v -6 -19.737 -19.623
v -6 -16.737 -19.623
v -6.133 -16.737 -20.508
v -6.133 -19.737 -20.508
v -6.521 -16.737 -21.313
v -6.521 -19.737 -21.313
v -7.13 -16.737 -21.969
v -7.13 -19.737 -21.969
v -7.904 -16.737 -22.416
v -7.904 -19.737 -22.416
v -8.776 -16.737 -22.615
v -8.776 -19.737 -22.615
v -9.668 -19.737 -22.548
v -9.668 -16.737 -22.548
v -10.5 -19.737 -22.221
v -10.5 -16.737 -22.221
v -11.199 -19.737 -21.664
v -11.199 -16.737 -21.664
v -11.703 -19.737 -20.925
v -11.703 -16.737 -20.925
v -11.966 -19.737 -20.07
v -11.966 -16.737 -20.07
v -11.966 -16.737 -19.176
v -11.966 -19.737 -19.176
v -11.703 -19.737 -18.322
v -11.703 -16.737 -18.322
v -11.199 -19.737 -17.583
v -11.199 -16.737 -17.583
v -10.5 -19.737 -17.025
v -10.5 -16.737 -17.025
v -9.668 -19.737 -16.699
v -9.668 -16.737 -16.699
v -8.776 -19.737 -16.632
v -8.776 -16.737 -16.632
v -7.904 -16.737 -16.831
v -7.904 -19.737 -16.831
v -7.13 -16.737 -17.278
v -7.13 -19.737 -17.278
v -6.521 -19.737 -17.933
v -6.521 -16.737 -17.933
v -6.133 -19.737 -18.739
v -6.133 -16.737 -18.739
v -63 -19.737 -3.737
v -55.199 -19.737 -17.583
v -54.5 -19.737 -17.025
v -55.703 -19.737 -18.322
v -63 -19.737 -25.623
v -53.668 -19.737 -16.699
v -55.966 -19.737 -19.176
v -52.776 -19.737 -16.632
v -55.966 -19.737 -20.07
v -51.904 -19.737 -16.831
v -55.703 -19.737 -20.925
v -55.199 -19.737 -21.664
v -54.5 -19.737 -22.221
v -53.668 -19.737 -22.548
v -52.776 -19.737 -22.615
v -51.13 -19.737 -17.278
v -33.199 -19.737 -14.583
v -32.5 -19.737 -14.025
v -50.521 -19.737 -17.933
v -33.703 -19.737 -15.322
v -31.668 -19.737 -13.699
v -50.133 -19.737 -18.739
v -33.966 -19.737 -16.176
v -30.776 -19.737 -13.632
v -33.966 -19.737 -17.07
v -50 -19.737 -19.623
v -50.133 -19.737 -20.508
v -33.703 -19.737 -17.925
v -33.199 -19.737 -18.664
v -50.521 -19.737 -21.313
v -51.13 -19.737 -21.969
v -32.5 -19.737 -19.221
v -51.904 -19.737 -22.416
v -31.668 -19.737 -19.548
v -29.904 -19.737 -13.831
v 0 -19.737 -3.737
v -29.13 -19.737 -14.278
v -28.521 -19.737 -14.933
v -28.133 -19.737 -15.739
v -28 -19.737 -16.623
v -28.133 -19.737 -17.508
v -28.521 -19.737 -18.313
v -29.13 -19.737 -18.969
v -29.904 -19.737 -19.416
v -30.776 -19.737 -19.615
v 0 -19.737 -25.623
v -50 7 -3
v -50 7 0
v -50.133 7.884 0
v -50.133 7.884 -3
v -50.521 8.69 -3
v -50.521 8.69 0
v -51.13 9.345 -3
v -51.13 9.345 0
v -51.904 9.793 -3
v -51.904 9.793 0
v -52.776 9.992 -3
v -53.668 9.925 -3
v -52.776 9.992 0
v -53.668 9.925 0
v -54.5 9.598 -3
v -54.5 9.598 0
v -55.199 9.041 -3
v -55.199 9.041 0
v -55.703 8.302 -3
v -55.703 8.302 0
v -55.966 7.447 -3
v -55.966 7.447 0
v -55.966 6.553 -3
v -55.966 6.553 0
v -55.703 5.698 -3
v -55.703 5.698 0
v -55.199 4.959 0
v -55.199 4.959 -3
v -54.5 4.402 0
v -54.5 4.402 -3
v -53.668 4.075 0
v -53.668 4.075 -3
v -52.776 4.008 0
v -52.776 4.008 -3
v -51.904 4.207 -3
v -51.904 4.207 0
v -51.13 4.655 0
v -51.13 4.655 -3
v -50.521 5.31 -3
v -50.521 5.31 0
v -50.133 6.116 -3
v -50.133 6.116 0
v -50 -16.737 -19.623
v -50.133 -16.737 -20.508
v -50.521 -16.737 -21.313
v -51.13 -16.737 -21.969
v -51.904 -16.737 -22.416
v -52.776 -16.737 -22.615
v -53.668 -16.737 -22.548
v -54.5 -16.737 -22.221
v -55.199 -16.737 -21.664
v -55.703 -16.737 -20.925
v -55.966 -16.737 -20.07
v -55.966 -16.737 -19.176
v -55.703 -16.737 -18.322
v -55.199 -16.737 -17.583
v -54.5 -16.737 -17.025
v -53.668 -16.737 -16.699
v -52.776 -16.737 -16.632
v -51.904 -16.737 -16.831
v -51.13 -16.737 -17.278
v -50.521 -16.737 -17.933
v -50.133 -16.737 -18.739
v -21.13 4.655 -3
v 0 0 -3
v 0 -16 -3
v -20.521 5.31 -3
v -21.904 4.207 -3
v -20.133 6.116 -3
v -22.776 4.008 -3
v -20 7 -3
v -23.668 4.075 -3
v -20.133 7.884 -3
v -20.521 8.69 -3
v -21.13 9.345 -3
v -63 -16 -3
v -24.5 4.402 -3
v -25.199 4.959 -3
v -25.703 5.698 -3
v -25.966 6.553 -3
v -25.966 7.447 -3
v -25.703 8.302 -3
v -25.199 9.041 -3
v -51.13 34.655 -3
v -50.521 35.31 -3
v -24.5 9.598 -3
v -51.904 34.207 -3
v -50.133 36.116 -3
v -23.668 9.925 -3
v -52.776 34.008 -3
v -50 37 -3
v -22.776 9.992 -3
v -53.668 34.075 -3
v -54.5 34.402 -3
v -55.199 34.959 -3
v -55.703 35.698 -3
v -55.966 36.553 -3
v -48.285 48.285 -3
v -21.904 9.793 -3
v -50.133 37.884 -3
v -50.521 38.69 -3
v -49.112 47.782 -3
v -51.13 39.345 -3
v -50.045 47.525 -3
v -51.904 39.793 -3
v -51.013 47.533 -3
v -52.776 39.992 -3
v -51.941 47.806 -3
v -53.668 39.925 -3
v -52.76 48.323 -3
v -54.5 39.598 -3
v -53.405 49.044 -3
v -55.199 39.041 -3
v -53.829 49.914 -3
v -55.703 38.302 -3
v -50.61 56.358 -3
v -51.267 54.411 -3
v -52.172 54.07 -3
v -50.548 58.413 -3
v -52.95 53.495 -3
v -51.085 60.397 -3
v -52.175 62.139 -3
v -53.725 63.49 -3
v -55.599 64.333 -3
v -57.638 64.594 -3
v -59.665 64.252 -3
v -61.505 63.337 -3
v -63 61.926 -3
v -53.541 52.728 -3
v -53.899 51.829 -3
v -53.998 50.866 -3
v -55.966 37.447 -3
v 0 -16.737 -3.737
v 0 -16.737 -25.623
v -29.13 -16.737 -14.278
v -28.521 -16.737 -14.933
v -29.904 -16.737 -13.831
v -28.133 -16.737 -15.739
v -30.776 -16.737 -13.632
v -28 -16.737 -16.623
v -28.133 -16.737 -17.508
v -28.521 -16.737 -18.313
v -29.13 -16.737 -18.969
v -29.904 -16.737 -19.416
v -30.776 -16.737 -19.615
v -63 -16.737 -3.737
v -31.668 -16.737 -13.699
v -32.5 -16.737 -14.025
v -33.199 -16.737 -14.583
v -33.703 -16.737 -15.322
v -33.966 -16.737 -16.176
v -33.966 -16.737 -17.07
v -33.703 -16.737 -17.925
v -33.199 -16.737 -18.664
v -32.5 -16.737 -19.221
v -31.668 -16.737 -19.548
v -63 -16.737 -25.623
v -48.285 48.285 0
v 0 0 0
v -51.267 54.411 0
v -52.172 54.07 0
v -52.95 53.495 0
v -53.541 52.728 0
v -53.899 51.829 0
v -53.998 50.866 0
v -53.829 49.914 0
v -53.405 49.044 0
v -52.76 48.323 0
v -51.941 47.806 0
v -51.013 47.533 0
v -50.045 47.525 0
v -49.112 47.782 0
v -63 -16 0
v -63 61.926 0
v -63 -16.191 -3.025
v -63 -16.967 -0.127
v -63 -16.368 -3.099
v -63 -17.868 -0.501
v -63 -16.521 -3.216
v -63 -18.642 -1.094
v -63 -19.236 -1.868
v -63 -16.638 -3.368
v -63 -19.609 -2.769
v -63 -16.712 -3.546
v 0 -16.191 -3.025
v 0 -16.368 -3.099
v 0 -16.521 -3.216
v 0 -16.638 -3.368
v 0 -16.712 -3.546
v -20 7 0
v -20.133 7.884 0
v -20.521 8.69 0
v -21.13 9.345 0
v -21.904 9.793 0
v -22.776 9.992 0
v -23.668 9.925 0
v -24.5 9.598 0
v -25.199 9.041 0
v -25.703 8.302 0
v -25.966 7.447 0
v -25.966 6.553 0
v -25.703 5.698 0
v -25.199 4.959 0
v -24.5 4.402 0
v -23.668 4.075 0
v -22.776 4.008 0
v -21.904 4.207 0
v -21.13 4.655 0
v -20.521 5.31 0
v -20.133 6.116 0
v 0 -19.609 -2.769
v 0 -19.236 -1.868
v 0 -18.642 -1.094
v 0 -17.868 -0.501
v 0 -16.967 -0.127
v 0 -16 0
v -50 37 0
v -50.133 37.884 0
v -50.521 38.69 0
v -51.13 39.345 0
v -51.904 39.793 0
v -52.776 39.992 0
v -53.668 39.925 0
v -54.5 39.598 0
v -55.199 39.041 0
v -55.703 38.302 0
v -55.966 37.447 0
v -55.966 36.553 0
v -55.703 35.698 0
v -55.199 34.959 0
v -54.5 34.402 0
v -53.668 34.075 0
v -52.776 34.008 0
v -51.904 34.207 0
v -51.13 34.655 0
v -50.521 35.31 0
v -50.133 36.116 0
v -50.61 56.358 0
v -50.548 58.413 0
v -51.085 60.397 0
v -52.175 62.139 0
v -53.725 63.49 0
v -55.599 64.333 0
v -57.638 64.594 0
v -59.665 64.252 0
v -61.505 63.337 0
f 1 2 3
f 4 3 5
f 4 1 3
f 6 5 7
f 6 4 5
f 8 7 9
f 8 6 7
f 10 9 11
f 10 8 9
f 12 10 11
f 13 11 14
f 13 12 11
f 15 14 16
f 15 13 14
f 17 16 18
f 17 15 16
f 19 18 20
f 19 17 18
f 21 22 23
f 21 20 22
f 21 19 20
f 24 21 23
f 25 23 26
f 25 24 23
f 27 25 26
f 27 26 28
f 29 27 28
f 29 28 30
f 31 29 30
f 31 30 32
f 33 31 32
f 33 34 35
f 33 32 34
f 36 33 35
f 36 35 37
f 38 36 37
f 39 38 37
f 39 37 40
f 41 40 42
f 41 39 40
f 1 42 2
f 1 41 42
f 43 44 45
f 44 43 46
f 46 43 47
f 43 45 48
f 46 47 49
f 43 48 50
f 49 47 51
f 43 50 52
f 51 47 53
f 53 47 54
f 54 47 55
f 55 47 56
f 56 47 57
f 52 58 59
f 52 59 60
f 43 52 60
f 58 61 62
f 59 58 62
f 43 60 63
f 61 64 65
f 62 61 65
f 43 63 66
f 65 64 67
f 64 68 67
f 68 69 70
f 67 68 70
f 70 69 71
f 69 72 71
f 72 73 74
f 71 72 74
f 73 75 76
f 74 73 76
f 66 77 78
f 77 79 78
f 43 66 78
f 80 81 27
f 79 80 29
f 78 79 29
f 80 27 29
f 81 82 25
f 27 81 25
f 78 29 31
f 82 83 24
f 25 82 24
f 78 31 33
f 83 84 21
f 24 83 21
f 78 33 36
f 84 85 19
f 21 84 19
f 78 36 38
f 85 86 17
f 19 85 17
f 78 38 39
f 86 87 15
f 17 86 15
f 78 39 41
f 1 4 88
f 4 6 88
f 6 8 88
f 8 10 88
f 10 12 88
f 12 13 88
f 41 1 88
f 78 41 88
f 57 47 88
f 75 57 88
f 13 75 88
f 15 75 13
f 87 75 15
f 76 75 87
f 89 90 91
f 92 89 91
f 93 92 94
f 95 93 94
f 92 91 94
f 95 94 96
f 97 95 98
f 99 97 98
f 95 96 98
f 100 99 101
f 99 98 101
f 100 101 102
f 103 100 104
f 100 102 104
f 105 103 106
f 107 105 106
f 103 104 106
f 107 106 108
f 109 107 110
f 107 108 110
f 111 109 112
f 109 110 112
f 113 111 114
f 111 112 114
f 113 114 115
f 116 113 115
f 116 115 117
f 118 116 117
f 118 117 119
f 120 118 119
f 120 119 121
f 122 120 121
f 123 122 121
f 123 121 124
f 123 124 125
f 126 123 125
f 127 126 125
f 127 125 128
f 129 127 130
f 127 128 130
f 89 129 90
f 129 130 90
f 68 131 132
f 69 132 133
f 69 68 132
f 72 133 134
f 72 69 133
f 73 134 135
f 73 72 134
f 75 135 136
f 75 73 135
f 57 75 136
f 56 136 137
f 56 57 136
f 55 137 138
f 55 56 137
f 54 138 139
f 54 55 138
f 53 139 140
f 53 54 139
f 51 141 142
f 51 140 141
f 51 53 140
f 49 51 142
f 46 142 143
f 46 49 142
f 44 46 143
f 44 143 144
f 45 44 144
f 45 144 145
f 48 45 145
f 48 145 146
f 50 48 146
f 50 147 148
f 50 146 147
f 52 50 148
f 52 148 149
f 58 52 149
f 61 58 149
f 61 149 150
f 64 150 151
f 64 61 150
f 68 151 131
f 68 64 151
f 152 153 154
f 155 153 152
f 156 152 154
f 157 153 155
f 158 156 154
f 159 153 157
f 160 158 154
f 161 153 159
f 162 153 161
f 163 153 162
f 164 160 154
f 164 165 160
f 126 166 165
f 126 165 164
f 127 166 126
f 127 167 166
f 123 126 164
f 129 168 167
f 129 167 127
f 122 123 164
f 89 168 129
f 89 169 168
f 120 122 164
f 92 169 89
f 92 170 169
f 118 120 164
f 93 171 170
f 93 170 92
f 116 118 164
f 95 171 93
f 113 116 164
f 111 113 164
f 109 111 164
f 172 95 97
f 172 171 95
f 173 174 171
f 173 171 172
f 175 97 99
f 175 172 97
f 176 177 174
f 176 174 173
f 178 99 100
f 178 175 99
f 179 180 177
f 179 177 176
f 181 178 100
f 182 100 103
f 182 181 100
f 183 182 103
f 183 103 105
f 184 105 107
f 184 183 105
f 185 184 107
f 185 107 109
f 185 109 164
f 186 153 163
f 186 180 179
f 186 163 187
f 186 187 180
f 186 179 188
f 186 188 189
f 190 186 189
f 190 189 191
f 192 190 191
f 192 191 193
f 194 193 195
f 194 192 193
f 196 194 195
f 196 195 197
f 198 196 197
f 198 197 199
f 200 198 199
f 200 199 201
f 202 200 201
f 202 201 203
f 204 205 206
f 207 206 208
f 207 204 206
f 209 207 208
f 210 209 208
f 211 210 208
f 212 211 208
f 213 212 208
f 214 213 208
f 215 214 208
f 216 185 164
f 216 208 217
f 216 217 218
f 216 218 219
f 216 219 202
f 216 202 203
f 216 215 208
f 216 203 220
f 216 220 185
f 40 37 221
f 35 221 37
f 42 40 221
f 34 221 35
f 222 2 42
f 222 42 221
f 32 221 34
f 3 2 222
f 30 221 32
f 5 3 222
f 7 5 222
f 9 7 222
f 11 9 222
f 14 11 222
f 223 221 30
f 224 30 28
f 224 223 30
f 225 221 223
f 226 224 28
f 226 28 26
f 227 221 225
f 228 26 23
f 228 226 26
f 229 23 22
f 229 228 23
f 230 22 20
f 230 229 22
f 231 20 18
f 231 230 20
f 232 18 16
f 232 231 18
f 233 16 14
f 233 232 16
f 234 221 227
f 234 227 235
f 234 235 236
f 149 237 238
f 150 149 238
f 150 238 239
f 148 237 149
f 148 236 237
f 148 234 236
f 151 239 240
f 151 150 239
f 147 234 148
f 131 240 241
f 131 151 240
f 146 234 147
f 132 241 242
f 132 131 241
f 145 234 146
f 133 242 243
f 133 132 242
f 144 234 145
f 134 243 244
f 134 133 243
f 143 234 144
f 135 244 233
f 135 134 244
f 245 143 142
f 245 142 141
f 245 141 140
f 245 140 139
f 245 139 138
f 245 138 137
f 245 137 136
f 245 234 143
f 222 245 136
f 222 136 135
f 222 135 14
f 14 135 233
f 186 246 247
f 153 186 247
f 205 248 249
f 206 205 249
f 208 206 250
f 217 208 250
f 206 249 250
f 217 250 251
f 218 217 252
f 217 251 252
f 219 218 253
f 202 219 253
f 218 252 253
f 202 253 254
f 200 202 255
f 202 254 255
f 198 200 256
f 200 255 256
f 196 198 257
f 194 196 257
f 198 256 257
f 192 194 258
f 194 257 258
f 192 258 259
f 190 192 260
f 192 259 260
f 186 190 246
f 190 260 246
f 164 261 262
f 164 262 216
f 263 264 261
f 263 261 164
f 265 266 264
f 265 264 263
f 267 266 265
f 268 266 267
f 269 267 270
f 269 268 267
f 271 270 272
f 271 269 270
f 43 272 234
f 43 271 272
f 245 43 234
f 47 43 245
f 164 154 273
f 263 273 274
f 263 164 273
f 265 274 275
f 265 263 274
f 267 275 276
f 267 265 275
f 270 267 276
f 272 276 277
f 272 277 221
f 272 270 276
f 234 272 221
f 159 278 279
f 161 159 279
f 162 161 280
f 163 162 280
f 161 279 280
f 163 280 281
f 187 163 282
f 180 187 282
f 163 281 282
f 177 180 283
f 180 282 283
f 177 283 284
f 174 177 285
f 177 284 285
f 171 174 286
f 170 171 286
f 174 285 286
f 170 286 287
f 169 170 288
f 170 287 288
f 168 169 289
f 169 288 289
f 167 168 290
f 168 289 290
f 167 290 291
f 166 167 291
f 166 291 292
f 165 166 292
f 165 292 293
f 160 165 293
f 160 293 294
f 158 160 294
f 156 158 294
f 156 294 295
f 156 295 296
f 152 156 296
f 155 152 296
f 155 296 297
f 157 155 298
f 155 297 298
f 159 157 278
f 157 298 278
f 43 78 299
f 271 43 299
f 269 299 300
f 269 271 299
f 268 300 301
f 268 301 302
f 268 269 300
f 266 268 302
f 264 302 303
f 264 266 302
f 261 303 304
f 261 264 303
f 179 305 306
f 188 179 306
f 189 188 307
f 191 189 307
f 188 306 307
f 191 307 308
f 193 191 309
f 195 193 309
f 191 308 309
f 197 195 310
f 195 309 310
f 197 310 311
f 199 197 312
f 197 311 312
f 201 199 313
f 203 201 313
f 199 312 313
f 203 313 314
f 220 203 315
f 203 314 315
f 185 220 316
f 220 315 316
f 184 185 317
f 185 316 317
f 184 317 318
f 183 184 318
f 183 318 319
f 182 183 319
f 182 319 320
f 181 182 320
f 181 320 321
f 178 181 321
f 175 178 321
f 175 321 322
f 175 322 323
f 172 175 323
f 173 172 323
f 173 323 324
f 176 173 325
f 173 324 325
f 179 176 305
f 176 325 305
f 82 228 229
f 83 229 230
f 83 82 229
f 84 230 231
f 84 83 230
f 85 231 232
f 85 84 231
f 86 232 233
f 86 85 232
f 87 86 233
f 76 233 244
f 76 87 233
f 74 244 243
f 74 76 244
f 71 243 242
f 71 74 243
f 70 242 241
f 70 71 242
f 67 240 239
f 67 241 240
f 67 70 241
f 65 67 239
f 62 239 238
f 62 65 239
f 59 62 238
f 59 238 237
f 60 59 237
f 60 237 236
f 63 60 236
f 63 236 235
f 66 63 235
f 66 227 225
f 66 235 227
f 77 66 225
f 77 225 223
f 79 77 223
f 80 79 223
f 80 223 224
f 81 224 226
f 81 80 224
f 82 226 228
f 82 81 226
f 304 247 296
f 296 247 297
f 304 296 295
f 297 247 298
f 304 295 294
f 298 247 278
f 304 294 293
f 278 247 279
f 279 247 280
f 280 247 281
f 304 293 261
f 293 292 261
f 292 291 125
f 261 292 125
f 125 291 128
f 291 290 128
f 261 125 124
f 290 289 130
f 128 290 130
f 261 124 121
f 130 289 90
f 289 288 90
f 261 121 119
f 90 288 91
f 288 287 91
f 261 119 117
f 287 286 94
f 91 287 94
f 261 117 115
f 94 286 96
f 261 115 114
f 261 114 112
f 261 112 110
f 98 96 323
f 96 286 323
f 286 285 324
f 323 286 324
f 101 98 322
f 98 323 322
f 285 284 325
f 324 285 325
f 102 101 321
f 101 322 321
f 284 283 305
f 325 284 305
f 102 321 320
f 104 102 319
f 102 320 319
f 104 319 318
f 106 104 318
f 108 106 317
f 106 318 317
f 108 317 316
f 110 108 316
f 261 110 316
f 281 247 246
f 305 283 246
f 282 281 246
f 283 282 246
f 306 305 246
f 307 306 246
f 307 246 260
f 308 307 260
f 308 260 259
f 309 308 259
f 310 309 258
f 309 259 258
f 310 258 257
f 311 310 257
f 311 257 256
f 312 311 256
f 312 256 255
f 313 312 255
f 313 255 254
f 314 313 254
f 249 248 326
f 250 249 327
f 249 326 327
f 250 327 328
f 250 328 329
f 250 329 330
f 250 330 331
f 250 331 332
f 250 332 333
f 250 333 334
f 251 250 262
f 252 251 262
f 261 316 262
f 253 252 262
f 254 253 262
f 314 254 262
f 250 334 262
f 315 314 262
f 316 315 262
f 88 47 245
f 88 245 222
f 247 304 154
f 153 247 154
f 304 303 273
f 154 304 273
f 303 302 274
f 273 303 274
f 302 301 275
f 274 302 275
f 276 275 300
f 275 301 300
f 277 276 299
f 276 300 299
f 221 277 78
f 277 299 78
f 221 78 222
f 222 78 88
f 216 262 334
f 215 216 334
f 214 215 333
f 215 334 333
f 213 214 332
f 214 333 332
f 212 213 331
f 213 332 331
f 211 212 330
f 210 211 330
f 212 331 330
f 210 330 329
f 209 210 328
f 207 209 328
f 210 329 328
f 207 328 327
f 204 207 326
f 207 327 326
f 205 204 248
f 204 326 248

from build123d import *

# Parameters (mm, degrees)
SCHIZZO2_R                           = 3
BASE_FLANGIA1_DEPTH                  = 3
PIEGATURA_START                      = -41.4
PIEGATURA_DELLO_SCHIZZO1_OUTLINE_W   = 63
PIEGATURA_DELLO_SCHIZZO1_OUTLINE_H   = 3
PIEGATURA_DELLO_SCHIZZO1_DEPTH       = 21.6634
PIEGATURA_START_2                    = -19.383939692
PIEGATURA_DELLO_SCHIZZO1_2_OUTLINE_W = 63
PIEGATURA_DELLO_SCHIZZO1_2_OUTLINE_H = 22.623356935
PIEGATURA_DELLO_SCHIZZO1_2_OUTLINE_R = 3
PIEGATURA_DELLO_SCHIZZO1_2_DEPTH     = 2.647339692
PIEGATURA_START_3                    = -19.7366
PIEGATURA_DELLO_SCHIZZO1_3_OUTLINE_W = 63
PIEGATURA_DELLO_SCHIZZO1_3_OUTLINE_H = 22.623356935
PIEGATURA_DELLO_SCHIZZO1_3_OUTLINE_R = 3
PIEGATURA_DELLO_SCHIZZO1_3_DEPTH     = 3.7366
PIEGATURA_START_4                    = -64
PIEGATURA_DELLO_SCHIZZO1_4_DEPTH     = 64


with BuildPart() as part:
    # Base-Flangia1: sheet metal written as solids
    # Schizzo2 → Base-Flangia1 (new body)
    with BuildSketch(Plane.XY):
        with BuildLine():
            Line((0, 0), (0, -41.4))
            Line((0, -41.4), (-63, -41.4))
            Line((-63, -41.4), (-63, 61.925683224))
            ThreePointArc((-63, 61.925683224), (-53.724596428, 63.490157792), (-51.266546346, 54.410582808))
            ThreePointArc((-51.266546346, 54.410582808), (-53.647048092, 49.463861618), (-48.285339065, 48.285339065))
            Line((-48.285339065, 48.285339065), (0, 0))
        make_face()
        with Locations((-53, 37)):
            Circle(SCHIZZO2_R, mode=Mode.SUBTRACT)
        with Locations((-53, 7)):
            Circle(SCHIZZO2_R, mode=Mode.SUBTRACT)
        with Locations((-23, 7)):
            Circle(SCHIZZO2_R, mode=Mode.SUBTRACT)
        with Locations((-53, -35.4)):
            Circle(SCHIZZO2_R, mode=Mode.SUBTRACT)
        with Locations((-31, -32.4)):
            Circle(SCHIZZO2_R, mode=Mode.SUBTRACT)
        with Locations((-9, -35.4)):
            Circle(SCHIZZO2_R, mode=Mode.SUBTRACT)
    extrude(amount=-BASE_FLANGIA1_DEPTH)

    # Piegatura dello schizzo1: read off the stored shape, not the designer's step
    # Piegatura dello schizzo1 outline → Piegatura dello schizzo1 (cut)
    with BuildSketch(Plane(origin=(0, 0, 0), x_dir=(1, 0, 0), z_dir=(0, 1, 0)).offset(PIEGATURA_START)):
        with Locations((-31.5, 1.5)):
            Rectangle(PIEGATURA_DELLO_SCHIZZO1_OUTLINE_W, PIEGATURA_DELLO_SCHIZZO1_OUTLINE_H)
    extrude(amount=PIEGATURA_DELLO_SCHIZZO1_DEPTH, mode=Mode.SUBTRACT)

    # Piegatura dello schizzo1 2 outline → Piegatura dello schizzo1 2 (add)
    with BuildSketch(Plane(origin=(0, 0, 0), x_dir=(1, 0, 0), z_dir=(0, 1, 0)).offset(PIEGATURA_START_2)):
        with Locations((-31.5, 14.311678468)):
            Rectangle(PIEGATURA_DELLO_SCHIZZO1_2_OUTLINE_W, PIEGATURA_DELLO_SCHIZZO1_2_OUTLINE_H)
        with Locations((-53, 19.623356935)):
            Circle(PIEGATURA_DELLO_SCHIZZO1_2_OUTLINE_R, mode=Mode.SUBTRACT)
        with Locations((-31, 16.623356935)):
            Circle(PIEGATURA_DELLO_SCHIZZO1_2_OUTLINE_R, mode=Mode.SUBTRACT)
        with Locations((-9, 19.623356935)):
            Circle(PIEGATURA_DELLO_SCHIZZO1_2_OUTLINE_R, mode=Mode.SUBTRACT)
    extrude(amount=PIEGATURA_DELLO_SCHIZZO1_2_DEPTH)

    # Piegatura dello schizzo1 3 outline → Piegatura dello schizzo1 3 (add)
    with BuildSketch(Plane(origin=(0, 0, 0), x_dir=(1, 0, 0), z_dir=(0, 1, 0)).offset(PIEGATURA_START_3)):
        with Locations((-31.5, 14.311678468)):
            Rectangle(PIEGATURA_DELLO_SCHIZZO1_3_OUTLINE_W, PIEGATURA_DELLO_SCHIZZO1_3_OUTLINE_H)
        with Locations((-53, 19.623356935)):
            Circle(PIEGATURA_DELLO_SCHIZZO1_3_OUTLINE_R, mode=Mode.SUBTRACT)
        with Locations((-31, 16.623356935)):
            Circle(PIEGATURA_DELLO_SCHIZZO1_3_OUTLINE_R, mode=Mode.SUBTRACT)
        with Locations((-9, 19.623356935)):
            Circle(PIEGATURA_DELLO_SCHIZZO1_3_OUTLINE_R, mode=Mode.SUBTRACT)
    extrude(amount=PIEGATURA_DELLO_SCHIZZO1_3_DEPTH)

    # Piegatura dello schizzo1 4 outline → Piegatura dello schizzo1 4 (cut)
    with BuildSketch(Plane.YZ.offset(PIEGATURA_START_4)):
        with BuildLine():
            ThreePointArc((-16, -3), (-16.520854855, -3.215745145), (-16.7366, -3.7366))
            Line((-16.7366, -3.7366), (-16.7366, -25.623356935))
            Line((-16.7366, -25.623356935), (-16, -25.623356935))
            Line((-16, -25.623356935), (-16, -3))
        make_face()
        with BuildLine():
            Line((-19.7366, 0), (-19.7366, -3.7366))
            ThreePointArc((-19.7366, -3.7366), (-18.642175199, -1.094424801), (-16, 0))
            Line((-16, 0), (-19.7366, 0))
        make_face()
    extrude(amount=PIEGATURA_DELLO_SCHIZZO1_4_DEPTH, mode=Mode.SUBTRACT)


solid = part.part
